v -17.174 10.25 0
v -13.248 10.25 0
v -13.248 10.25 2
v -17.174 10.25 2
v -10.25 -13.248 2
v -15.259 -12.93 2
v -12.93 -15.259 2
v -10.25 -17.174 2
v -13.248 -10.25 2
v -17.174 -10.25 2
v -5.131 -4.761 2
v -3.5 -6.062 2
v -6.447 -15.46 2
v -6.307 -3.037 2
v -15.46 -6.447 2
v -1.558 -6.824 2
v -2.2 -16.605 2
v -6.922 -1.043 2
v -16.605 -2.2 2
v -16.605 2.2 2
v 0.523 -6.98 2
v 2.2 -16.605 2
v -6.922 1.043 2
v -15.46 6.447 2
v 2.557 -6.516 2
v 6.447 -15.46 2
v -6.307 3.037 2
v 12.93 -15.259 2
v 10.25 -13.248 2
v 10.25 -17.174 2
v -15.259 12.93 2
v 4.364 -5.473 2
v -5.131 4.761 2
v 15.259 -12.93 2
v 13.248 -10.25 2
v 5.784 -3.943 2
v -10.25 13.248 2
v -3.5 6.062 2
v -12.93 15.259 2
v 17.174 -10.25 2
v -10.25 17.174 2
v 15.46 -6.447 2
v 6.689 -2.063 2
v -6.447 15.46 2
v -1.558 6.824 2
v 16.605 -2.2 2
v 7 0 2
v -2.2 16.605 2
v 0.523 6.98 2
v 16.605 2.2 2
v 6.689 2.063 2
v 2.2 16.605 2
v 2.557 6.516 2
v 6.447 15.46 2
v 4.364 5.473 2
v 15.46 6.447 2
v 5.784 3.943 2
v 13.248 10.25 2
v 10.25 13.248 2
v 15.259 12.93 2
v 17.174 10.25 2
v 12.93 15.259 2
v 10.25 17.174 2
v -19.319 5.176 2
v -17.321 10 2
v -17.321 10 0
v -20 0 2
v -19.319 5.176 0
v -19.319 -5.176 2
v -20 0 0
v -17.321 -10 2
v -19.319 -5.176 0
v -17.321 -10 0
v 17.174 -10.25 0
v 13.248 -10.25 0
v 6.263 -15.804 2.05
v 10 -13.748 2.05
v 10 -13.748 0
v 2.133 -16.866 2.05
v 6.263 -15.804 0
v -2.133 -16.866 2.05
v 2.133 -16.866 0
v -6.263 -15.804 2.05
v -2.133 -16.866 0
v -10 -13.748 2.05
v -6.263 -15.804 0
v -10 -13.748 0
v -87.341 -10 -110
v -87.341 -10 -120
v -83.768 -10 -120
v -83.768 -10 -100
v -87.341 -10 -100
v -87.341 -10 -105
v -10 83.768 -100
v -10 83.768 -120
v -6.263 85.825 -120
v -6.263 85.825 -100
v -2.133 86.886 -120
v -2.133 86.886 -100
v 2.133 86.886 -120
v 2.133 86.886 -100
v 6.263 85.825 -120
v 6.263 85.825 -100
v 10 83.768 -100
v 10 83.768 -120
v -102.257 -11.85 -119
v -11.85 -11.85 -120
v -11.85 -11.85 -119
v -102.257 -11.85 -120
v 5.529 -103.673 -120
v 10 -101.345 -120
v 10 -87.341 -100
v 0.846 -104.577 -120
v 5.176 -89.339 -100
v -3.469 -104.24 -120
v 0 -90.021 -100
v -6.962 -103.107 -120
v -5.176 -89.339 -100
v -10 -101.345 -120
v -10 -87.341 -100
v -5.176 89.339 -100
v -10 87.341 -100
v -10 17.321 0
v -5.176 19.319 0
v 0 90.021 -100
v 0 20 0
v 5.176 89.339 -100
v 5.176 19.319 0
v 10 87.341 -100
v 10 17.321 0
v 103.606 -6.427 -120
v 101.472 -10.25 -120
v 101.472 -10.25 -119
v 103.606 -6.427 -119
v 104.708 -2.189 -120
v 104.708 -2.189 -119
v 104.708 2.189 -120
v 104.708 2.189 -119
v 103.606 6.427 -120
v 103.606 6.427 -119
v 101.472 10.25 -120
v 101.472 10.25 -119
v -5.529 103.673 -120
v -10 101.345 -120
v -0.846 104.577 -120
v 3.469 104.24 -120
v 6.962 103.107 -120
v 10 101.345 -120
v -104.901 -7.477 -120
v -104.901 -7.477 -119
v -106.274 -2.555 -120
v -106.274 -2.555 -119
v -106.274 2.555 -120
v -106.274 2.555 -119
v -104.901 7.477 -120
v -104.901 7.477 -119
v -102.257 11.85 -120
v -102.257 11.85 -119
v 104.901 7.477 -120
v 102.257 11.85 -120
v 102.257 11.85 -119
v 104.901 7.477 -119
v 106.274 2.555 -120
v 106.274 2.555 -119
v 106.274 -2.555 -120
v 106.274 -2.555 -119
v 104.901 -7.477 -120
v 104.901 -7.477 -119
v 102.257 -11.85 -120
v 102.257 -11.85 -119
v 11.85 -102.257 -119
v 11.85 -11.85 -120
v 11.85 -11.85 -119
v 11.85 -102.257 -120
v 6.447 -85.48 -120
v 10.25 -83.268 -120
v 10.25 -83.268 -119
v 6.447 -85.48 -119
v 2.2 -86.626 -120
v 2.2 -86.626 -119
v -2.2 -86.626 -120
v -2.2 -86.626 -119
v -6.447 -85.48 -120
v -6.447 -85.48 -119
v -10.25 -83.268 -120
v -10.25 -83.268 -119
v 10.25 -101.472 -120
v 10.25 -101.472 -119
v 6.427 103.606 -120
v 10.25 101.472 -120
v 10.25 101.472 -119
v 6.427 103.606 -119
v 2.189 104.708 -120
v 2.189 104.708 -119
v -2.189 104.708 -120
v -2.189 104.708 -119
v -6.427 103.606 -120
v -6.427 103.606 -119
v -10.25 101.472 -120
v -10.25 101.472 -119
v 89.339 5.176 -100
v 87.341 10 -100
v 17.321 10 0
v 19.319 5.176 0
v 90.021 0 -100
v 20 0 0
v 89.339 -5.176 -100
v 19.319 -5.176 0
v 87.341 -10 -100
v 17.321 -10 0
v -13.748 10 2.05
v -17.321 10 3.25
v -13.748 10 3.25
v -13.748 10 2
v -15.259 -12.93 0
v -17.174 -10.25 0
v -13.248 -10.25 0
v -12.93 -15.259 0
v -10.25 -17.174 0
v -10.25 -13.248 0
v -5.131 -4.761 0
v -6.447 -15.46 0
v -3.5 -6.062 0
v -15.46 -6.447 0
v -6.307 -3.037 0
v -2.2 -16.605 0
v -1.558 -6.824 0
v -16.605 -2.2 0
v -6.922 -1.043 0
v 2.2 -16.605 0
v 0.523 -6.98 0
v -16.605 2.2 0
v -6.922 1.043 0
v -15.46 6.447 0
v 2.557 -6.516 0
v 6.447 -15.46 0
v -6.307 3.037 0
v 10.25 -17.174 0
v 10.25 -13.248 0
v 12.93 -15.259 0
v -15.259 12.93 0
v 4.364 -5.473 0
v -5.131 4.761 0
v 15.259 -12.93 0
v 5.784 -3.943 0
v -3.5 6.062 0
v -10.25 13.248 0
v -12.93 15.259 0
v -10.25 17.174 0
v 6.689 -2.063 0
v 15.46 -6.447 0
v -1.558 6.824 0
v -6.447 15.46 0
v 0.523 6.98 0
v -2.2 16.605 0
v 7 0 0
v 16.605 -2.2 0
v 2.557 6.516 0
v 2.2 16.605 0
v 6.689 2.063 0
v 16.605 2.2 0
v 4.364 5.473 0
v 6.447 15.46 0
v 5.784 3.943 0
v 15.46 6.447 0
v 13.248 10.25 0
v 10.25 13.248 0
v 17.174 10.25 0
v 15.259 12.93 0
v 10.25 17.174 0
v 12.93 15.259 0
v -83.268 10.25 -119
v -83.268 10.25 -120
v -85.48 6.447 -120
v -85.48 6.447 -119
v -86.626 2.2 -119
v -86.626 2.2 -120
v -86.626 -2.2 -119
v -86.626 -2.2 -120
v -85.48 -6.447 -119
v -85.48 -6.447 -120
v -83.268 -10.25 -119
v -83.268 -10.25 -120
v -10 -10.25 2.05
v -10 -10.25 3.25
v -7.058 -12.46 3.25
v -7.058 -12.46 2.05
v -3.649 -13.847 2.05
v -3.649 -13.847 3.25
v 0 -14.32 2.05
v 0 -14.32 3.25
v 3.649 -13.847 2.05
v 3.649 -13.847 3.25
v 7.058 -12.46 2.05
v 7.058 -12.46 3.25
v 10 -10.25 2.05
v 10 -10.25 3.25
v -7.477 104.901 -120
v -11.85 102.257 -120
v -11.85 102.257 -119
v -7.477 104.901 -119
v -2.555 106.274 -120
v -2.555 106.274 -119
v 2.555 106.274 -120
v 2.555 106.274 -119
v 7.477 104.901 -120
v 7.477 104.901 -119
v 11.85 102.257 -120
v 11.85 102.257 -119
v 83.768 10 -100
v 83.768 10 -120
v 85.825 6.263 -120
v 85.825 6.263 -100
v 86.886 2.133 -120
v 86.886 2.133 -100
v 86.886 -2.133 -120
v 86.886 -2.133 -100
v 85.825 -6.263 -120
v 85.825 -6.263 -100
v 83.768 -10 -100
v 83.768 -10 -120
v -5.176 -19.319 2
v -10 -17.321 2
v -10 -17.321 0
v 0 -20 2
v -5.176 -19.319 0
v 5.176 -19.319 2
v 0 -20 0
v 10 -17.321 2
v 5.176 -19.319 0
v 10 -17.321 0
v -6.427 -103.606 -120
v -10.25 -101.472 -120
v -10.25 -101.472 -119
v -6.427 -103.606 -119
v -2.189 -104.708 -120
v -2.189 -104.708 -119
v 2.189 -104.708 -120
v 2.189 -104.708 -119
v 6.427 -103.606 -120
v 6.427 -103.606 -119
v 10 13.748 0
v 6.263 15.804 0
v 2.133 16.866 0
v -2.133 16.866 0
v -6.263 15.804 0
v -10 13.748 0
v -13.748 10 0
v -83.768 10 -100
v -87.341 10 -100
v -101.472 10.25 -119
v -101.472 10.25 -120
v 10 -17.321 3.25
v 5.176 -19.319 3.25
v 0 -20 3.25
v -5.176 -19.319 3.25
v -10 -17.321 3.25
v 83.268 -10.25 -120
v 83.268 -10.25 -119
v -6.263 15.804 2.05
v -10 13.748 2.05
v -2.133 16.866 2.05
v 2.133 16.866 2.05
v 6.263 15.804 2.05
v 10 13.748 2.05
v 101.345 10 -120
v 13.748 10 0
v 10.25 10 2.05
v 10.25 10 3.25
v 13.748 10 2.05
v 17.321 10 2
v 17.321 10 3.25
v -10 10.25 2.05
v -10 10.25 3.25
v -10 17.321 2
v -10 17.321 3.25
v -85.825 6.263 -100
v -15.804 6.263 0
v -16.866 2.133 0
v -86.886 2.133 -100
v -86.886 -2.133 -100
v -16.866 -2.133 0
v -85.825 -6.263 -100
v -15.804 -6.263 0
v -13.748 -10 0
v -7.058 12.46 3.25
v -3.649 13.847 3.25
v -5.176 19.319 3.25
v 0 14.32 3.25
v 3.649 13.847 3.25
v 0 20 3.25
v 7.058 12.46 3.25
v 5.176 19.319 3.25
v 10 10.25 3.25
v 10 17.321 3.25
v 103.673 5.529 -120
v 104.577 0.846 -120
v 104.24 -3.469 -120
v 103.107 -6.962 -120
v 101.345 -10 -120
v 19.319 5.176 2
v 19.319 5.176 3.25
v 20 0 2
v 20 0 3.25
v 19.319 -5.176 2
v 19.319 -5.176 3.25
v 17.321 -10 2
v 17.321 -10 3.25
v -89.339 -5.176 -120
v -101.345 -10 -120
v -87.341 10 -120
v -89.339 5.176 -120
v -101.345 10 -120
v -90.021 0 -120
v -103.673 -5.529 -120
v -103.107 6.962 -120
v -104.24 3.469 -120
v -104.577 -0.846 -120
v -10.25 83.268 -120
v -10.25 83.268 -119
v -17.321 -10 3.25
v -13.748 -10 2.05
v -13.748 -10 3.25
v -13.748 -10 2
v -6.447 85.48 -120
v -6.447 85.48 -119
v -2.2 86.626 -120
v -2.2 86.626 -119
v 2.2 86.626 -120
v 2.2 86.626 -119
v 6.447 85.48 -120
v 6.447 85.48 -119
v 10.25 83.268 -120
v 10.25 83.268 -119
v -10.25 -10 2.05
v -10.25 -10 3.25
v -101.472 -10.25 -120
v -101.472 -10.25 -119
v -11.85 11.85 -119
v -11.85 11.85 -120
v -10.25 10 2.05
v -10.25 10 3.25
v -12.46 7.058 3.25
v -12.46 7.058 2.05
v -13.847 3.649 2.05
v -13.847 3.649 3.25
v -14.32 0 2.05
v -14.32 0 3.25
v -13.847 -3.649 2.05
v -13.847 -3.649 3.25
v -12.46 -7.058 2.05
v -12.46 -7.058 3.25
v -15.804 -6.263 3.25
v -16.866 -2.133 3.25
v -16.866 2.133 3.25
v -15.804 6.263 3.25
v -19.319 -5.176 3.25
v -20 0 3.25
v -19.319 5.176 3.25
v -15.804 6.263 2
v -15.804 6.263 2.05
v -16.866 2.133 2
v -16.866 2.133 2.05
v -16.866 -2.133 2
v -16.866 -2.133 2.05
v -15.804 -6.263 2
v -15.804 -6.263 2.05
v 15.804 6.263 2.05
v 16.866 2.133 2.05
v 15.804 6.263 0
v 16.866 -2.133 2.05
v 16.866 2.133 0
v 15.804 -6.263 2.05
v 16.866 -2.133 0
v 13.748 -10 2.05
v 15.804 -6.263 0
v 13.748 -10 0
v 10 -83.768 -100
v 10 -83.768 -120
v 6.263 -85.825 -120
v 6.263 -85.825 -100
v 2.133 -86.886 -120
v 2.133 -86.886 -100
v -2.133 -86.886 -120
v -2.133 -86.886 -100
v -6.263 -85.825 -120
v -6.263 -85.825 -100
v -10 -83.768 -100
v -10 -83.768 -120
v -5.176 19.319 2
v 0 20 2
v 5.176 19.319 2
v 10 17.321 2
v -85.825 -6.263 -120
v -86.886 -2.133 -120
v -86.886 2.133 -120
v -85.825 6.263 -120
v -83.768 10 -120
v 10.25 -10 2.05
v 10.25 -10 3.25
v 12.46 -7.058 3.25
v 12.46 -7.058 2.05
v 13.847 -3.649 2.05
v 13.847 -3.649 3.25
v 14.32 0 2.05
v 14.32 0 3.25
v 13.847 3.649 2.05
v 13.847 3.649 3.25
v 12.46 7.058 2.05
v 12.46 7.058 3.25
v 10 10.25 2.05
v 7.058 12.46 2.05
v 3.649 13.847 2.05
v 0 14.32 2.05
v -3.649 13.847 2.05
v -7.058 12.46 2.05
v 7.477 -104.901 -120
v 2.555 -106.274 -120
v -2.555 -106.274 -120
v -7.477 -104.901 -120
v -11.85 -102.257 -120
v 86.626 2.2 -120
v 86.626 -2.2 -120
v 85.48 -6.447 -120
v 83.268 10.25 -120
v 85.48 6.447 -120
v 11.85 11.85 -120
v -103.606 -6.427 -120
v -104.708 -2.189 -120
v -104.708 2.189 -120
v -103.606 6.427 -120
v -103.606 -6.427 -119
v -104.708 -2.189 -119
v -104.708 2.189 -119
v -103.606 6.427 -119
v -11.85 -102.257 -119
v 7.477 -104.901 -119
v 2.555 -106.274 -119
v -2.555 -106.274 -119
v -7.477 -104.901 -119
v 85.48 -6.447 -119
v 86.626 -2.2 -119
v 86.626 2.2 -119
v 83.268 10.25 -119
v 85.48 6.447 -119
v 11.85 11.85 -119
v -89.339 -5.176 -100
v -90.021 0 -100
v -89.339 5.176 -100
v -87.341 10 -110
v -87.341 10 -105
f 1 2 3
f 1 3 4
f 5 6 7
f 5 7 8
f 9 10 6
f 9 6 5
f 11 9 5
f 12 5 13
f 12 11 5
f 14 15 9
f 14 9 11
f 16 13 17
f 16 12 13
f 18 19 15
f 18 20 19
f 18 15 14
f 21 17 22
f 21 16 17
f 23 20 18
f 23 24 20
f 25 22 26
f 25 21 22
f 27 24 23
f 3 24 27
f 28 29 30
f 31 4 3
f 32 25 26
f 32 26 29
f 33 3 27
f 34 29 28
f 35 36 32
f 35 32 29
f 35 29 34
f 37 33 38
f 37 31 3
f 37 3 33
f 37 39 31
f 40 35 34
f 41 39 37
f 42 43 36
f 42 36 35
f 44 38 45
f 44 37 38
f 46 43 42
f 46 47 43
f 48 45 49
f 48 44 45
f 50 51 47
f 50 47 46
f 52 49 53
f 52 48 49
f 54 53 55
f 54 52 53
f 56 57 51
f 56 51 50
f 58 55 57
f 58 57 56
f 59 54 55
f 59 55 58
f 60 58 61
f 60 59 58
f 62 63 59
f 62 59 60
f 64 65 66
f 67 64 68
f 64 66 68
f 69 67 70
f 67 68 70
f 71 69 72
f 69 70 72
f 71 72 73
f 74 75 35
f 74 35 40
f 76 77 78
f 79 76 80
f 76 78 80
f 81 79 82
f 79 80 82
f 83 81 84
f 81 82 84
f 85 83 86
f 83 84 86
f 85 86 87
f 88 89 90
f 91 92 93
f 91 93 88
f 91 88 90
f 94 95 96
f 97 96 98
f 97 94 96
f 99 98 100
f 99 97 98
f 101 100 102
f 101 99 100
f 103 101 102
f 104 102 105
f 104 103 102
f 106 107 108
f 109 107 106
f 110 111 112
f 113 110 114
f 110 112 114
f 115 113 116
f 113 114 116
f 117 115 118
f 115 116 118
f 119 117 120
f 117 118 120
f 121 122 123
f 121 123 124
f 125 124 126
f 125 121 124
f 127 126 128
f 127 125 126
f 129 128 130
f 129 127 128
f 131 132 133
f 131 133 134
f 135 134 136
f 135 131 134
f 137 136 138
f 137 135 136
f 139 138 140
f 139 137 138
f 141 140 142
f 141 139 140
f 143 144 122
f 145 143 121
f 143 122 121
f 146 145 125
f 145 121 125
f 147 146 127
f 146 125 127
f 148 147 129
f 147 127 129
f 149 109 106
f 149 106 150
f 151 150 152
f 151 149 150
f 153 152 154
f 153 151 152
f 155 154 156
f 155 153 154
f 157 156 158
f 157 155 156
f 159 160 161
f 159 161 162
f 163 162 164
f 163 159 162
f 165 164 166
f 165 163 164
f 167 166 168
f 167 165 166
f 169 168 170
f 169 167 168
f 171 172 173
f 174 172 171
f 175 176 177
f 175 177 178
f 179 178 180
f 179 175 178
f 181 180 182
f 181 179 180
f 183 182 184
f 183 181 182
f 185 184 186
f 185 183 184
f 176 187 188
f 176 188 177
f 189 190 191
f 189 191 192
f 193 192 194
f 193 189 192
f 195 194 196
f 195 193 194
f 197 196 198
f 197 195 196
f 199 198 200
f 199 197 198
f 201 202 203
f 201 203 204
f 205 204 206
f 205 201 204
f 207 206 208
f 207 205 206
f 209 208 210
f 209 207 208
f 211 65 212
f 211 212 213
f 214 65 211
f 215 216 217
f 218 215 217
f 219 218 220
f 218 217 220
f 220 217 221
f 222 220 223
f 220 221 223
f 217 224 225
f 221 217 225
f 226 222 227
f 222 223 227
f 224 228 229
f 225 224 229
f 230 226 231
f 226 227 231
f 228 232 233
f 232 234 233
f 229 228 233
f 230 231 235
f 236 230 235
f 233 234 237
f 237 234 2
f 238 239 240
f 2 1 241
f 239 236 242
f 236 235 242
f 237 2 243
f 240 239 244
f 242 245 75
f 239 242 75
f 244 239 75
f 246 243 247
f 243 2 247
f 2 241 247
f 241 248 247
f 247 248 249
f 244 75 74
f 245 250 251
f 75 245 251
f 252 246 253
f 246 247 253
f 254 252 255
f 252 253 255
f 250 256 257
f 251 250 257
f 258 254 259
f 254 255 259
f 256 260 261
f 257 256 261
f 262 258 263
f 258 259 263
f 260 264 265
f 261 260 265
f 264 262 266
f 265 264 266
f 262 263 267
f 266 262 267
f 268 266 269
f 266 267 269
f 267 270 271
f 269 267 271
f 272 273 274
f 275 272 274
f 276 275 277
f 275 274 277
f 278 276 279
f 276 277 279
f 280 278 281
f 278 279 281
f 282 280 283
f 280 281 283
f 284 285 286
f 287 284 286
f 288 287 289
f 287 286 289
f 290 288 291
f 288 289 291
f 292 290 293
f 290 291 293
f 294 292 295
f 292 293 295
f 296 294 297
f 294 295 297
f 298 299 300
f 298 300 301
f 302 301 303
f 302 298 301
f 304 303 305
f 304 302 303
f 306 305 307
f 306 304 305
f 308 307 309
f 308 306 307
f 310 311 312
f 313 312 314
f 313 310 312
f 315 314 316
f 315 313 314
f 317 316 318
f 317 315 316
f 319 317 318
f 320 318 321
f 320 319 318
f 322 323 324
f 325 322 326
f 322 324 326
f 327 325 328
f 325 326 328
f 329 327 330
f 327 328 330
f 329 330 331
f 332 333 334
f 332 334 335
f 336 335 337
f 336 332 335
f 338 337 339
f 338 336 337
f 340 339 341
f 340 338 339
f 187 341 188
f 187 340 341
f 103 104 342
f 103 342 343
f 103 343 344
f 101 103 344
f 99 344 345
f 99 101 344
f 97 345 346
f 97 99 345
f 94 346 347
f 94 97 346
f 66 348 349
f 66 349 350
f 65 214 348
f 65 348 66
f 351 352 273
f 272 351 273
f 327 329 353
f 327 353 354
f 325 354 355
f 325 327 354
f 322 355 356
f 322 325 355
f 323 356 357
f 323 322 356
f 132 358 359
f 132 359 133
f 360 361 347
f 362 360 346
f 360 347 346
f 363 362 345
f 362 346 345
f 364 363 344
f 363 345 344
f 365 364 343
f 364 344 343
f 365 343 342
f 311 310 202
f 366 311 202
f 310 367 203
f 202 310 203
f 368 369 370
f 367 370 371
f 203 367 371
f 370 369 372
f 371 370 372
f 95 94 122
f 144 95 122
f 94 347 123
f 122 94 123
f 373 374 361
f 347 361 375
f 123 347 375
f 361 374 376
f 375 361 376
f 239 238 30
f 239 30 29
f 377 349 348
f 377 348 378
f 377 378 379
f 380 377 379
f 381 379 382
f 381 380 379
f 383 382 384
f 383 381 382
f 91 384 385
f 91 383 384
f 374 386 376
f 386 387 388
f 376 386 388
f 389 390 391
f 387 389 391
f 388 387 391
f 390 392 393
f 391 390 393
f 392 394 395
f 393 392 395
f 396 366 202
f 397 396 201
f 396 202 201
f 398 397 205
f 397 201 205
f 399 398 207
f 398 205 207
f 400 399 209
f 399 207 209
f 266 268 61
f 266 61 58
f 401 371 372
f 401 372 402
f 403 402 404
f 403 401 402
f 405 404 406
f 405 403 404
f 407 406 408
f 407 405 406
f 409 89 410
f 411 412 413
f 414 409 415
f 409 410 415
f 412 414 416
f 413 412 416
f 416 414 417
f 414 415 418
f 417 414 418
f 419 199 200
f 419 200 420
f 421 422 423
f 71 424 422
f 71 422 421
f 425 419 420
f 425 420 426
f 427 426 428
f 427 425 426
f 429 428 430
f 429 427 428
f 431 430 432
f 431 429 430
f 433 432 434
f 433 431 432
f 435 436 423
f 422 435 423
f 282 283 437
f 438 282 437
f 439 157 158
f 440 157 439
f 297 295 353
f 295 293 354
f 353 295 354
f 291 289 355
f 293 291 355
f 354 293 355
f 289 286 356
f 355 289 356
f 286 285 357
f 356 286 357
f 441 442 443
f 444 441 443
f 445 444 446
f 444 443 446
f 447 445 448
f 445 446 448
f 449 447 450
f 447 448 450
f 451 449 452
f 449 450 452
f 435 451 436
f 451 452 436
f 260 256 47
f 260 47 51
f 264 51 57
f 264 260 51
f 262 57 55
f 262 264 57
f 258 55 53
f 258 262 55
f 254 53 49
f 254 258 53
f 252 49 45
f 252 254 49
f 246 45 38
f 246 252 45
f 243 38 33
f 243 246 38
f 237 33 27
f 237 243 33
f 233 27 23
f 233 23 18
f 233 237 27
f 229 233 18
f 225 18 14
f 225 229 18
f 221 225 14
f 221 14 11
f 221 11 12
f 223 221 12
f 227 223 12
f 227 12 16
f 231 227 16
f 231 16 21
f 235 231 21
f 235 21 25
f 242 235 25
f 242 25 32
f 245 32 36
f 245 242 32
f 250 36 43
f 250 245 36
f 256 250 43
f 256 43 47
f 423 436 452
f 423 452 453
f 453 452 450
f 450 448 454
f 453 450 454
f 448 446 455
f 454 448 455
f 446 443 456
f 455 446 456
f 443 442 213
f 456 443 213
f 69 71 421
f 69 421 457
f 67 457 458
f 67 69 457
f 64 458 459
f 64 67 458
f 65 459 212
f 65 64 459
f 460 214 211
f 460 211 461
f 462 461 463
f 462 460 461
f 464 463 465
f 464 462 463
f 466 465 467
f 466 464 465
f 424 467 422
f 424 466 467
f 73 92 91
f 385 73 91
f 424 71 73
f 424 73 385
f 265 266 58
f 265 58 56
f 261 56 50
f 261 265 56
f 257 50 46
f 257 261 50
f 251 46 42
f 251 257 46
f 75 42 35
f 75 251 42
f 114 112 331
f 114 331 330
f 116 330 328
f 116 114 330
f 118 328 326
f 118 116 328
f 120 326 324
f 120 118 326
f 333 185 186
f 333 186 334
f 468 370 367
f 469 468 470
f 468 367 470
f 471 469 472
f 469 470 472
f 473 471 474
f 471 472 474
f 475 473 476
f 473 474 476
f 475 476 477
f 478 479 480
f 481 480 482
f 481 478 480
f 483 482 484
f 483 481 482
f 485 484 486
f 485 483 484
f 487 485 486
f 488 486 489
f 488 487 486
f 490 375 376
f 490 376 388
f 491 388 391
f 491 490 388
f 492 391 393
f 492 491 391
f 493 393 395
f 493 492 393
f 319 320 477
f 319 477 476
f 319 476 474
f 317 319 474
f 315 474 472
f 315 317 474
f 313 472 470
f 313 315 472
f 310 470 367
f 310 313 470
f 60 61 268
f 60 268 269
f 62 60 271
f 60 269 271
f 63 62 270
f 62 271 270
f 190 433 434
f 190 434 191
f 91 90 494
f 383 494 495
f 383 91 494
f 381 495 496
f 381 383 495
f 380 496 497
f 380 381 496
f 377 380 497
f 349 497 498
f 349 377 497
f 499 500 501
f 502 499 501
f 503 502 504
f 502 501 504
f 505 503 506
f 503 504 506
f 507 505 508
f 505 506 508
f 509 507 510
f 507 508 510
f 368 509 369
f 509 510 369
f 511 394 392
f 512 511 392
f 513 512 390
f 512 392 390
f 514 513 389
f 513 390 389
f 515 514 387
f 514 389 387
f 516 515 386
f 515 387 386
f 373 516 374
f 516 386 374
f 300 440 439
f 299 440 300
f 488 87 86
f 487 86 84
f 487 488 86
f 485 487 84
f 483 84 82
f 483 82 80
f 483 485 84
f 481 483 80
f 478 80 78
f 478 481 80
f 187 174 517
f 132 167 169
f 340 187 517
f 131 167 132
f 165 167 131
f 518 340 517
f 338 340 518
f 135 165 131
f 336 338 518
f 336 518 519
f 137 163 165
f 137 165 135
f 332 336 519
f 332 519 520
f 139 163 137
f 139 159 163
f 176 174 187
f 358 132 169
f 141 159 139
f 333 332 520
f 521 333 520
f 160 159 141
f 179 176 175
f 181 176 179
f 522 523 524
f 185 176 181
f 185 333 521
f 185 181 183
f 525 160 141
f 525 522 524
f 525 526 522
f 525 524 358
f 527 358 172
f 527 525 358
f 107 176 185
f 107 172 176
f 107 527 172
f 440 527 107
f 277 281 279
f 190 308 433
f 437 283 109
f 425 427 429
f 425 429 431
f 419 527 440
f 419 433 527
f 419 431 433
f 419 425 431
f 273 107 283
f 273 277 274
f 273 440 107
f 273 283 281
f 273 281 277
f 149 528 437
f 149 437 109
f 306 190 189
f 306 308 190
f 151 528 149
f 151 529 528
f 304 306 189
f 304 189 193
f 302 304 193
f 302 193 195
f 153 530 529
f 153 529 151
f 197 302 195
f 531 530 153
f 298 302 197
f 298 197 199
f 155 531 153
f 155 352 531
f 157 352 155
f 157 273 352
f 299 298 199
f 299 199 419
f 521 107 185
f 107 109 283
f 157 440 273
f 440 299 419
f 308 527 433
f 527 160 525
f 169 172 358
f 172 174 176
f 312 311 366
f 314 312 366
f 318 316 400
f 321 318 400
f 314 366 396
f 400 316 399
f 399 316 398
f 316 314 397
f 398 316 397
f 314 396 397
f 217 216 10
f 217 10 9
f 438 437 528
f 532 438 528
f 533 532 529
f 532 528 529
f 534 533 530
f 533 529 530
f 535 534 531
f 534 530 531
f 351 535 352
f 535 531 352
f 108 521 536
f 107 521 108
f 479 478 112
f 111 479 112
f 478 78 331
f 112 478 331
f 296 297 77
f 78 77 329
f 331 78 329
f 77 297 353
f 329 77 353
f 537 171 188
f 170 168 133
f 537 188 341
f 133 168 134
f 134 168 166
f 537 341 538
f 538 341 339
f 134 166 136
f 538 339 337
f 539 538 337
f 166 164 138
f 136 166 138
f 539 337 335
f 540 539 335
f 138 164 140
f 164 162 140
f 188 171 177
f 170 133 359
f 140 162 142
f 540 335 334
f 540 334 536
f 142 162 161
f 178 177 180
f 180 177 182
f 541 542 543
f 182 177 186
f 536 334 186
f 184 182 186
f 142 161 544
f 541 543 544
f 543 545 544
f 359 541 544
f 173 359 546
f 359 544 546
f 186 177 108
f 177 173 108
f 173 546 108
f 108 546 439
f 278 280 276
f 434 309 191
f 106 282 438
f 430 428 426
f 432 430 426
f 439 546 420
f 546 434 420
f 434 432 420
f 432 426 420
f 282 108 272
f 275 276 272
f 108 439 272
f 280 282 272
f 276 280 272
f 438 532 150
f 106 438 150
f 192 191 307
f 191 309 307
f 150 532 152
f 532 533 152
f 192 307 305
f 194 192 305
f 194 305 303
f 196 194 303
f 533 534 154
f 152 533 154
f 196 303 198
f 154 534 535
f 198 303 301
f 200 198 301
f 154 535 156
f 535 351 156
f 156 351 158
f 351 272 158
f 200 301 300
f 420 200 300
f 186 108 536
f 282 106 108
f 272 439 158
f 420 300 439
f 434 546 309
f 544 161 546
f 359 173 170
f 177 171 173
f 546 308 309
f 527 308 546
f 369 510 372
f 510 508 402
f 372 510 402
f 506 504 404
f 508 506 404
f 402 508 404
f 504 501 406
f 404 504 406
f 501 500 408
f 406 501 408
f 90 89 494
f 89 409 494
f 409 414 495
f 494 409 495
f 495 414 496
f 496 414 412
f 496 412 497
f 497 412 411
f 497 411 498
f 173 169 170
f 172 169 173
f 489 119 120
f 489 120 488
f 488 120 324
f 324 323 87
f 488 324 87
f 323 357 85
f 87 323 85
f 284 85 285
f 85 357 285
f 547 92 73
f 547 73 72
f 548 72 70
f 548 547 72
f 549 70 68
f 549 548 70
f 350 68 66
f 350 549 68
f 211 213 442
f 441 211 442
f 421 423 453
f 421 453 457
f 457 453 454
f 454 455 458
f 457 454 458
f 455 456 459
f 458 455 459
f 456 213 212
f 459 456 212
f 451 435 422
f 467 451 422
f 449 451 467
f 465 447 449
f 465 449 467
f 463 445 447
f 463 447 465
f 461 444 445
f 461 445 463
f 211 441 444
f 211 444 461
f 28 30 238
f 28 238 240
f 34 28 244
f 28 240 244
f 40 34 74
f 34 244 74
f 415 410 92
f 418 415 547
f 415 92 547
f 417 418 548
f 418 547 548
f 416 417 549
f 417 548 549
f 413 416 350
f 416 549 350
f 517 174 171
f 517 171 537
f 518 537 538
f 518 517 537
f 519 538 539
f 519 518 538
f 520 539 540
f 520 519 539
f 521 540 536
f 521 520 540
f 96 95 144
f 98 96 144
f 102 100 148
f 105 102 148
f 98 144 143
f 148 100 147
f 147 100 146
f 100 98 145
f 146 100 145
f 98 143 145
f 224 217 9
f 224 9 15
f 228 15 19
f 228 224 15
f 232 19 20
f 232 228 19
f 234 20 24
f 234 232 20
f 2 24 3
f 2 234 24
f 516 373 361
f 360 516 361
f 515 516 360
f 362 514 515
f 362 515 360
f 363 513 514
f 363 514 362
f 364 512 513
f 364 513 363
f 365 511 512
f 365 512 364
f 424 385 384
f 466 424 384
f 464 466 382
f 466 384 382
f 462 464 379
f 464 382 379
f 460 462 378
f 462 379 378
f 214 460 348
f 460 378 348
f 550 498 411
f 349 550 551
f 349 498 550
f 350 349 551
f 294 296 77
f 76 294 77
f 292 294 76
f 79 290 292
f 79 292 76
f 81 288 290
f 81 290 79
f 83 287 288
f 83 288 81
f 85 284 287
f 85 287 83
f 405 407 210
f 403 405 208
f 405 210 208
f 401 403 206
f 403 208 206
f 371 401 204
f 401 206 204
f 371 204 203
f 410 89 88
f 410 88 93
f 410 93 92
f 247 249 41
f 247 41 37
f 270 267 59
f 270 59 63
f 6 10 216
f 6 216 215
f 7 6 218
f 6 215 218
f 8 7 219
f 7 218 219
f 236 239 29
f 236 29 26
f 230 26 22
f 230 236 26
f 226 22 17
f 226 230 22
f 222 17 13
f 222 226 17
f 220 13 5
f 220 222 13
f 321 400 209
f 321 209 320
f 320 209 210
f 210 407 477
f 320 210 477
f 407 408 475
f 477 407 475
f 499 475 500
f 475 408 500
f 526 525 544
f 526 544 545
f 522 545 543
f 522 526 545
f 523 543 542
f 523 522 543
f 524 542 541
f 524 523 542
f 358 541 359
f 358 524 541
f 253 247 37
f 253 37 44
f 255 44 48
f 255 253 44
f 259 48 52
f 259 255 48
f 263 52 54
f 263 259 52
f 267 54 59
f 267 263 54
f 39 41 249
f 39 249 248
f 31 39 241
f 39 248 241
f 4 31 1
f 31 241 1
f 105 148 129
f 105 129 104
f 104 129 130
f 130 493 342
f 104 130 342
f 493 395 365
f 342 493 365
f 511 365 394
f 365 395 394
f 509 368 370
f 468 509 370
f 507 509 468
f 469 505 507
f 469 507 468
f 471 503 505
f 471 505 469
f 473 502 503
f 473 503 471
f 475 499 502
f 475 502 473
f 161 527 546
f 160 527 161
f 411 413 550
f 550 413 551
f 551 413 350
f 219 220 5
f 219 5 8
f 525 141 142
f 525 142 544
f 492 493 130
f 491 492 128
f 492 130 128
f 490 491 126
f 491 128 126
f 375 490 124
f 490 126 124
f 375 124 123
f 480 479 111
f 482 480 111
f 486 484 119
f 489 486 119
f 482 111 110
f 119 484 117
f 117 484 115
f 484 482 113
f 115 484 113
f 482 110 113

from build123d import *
from build123d.topology import SkipClean

# Parameters (mm, degrees)
SKETCH1_R           = 20
SKETCH1_R_2         = 7
BOSS_EXTRUDE1_DEPTH = 2
BOSS_EXTRUDE3_DEPTH = 20
CUT_EXTRUDE1_DEPTH  = 152.339803484
BOSS_EXTRUDE4_DEPTH = 1.25
BOSS_EXTRUDE5_DEPTH = 1.2
CIRPATTERN3_COUNT   = 4
BOSS_EXTRUDE6_DEPTH = 1


with BuildPart() as part:
    # Sketch1 → Boss-Extrude1 (new body)
    with BuildSketch(Plane.XY):
        Circle(SKETCH1_R)
        Circle(SKETCH1_R_2, mode=Mode.SUBTRACT)
    extrude(amount=BOSS_EXTRUDE1_DEPTH)

    # Sweep1: sweep along a path in Sketch2
    with BuildLine(Plane(origin=(0, 0, 0), x_dir=(1, 0, 0), z_dir=(0, 1, 0))) as sweep1_path:
        Line((-20, 0), (-90.020753821, 100))
    # Sketch3 → Sweep1 (sweep)
    with BuildSketch(Plane(origin=(0, 0, 0), x_dir=(-1, 0, 0), z_dir=(0, 0, -1))):
        with BuildLine():
            Line((13.747727085, -10), (17.320508076, -10))
            ThreePointArc((17.320508076, -10), (20, 0), (17.320508076, 10))
            Line((17.320508076, 10), (13.747727085, 10))
            ThreePointArc((13.747727085, 10), (17, 0), (13.747727085, -10))
        make_face()
    sweep(path=sweep1_path.line)

    # Sketch4 → Boss-Extrude3 (add)
    with BuildSketch(Plane(origin=(0, 0, -100), x_dir=(-1, 0, 0), z_dir=(0, 0, -1))):
        with BuildLine():
            Line((87.341261897, -10), (83.768480906, -10))
            ThreePointArc((83.768480906, -10), (87.020753821, 0), (83.768480906, 10))
            Line((83.768480906, 10), (87.341261897, 10))
            ThreePointArc((87.341261897, 10), (90.020753821, 0), (87.341261897, -10))
        make_face()
    extrude(amount=BOSS_EXTRUDE3_DEPTH)

    # Sketch5 → Cut-Extrude1 (cut, through all)
    # profile 1 of 4: a face of its own
    with BuildSketch(Plane(origin=(0, 0, 0), x_dir=(-1, 0, 0), z_dir=(0, 0, -1))):
        with BuildLine():
            Line((17.464249197, -10.25), (13.247641299, -10.25))
            ThreePointArc((13.247641299, -10.25), (16.75, 0), (13.247641299, 10.25))
            Line((13.247641299, 10.25), (17.464249197, 10.25))
            ThreePointArc((17.464249197, 10.25), (20.25, 0), (17.464249197, -10.25))
        make_face()
        with BuildLine():
            Line((17.320508076, -10), (13.747727085, -10))
            ThreePointArc((13.747727085, -10), (17, 0), (13.747727085, 10))
            Line((13.747727085, 10), (17.320508076, 10))
            ThreePointArc((17.320508076, 10), (20, 0), (17.320508076, -10))
        make_face(mode=Mode.SUBTRACT)
    # profile 2 of 4: a face of its own
    with BuildSketch(Plane(origin=(0, 0, 0), x_dir=(-1, 0, 0), z_dir=(0, 0, -1))):
        with BuildLine():
            Line((-10.25, -17.464249197), (-10.25, -13.247641299))
            ThreePointArc((-10.25, -13.247641299), (0, -16.75), (10.25, -13.247641299))
            Line((10.25, -13.247641299), (10.25, -17.464249197))
            ThreePointArc((10.25, -17.464249197), (0, -20.25), (-10.25, -17.464249197))
        make_face()
        with BuildLine():
            Line((-10, -17.320508076), (-10, -13.747727085))
            ThreePointArc((-10, -13.747727085), (0, -17), (10, -13.747727085))
            Line((10, -13.747727085), (10, -17.320508076))
            ThreePointArc((10, -17.320508076), (0, -20), (-10, -17.320508076))
        make_face(mode=Mode.SUBTRACT)
    # profile 3 of 4: a face of its own
    with BuildSketch(Plane(origin=(0, 0, 0), x_dir=(-1, 0, 0), z_dir=(0, 0, -1))):
        with BuildLine():
            Line((-17.464249197, 10.25), (-13.247641299, 10.25))
            ThreePointArc((-13.247641299, 10.25), (-16.75, 0), (-13.247641299, -10.25))
            Line((-13.247641299, -10.25), (-17.464249197, -10.25))
            ThreePointArc((-17.464249197, -10.25), (-20.25, 0), (-17.464249197, 10.25))
        make_face()
        with BuildLine():
            Line((-17.320508076, 10), (-13.747727085, 10))
            ThreePointArc((-13.747727085, 10), (-17, 0), (-13.747727085, -10))
            Line((-13.747727085, -10), (-17.320508076, -10))
            ThreePointArc((-17.320508076, -10), (-20, 0), (-17.320508076, 10))
        make_face(mode=Mode.SUBTRACT)
    # profile 4 of 4: a face of its own
    with BuildSketch(Plane(origin=(0, 0, 0), x_dir=(-1, 0, 0), z_dir=(0, 0, -1))):
        with BuildLine():
            Line((10.25, 17.464249197), (10.25, 13.247641299))
            ThreePointArc((10.25, 13.247641299), (0, 16.75), (-10.25, 13.247641299))
            Line((-10.25, 13.247641299), (-10.25, 17.464249197))
            ThreePointArc((-10.25, 17.464249197), (0, 20.25), (10.25, 17.464249197))
        make_face()
        with BuildLine():
            Line((10, 17.320508076), (10, 13.747727085))
            ThreePointArc((10, 13.747727085), (0, 17), (-10, 13.747727085))
            Line((-10, 13.747727085), (-10, 17.320508076))
            ThreePointArc((-10, 17.320508076), (0, 20), (10, 17.320508076))
        make_face(mode=Mode.SUBTRACT)
    extrude(amount=-CUT_EXTRUDE1_DEPTH, mode=Mode.SUBTRACT)


with BuildPart() as cut_extrude1_piece_1:
    # of the separate pieces the step leaves, piece 1, a body of its own (cut_extrude1_pieces_kept)
    add(part.part.solids().sort_by_distance((-17.320508076, 10, 2))[0])

    # Sketch6 → Boss-Extrude4 (add)
    with SkipClean():  # the faces are left unmerged after this step: merging them gives an invalid solid
        with BuildSketch(Plane.XY.offset(2)):
            with BuildLine():
                Line((-17.320508076, 10), (-13.747727085, 10))
                ThreePointArc((-13.747727085, 10), (-17, 0), (-13.747727085, -10))
                Line((-13.747727085, -10), (-17.320508076, -10))
                ThreePointArc((-17.320508076, -10), (-20, 0), (-17.320508076, 10))
            make_face()
        extrude(amount=BOSS_EXTRUDE4_DEPTH)

    # Sketch7 → Boss-Extrude5 (add)
    with SkipClean():  # the faces are left unmerged after this step: merging them gives an invalid solid
        with BuildSketch(Plane.XY.offset(3.25)):
            with BuildLine():
                Line((-13.747727085, 10), (-10.25, 10))
                ThreePointArc((-10.25, 10), (-14.320003492, 0), (-10.25, -10))
                Line((-10.25, -10), (-13.747727085, -10))
                ThreePointArc((-13.747727085, -10), (-17, 0), (-13.747727085, 10))
            make_face()
        extrude(amount=-BOSS_EXTRUDE5_DEPTH)

    # Sketch9 for Loft1 → Loft1 section 0
    with SkipClean():  # the faces are left unmerged after this step: merging them gives an invalid solid
        with BuildSketch(Plane(origin=(0, 0, -120), x_dir=(-1, 0, 0), z_dir=(0, 0, -1))):
            with BuildLine():
                Line((83.768480906, -10), (101.345412661, -10))
                # circular arc as an exact rational Bezier (weights 1, cos(half-angle), 1)
                Bezier((101.345412661, -10), (108.619342335, 0), (101.345412661, 10), weights=[1, 0.808689829, 1])
                Line((101.345412661, 10), (83.768480906, 10))
                Bezier((83.768480906, 10), (91.04241058, 0), (83.768480906, -10), weights=[1, 0.808689829, 1])
            make_face()
        # Sketch4<2> for Loft1 → Loft1 section 1
        with BuildSketch(Plane(origin=(0, 0, -100), x_dir=(-1, 0, 0), z_dir=(0, 0, -1))):
            with BuildLine():
                Line((87.341261897, -10), (83.768480906, -10))
                Bezier((83.768480906, -10), (91.04241058, 0), (83.768480906, 10), weights=[1, 0.808689829, 1])
                Line((83.768480906, 10), (87.341261897, 10))
                Bezier((87.341261897, 10), (93.114764589, 0), (87.341261897, -10), weights=[1, 0.866025404, 1])
            make_face()
        loft()


with BuildPart() as cut_extrude1_piece_2:
    # of the separate pieces the step leaves, piece 2, a body of its own (cut_extrude1_pieces_kept)
    add(part.part.solids().sort_by_distance((17.173744496, -10.25, 2))[0])


with BuildPart() as cirpattern3_1:
    # CirPattern3: pattern copy
    add(cut_extrude1_piece_1.part.rotate(Axis((0, 0, 0), (0, 0, -1)), 1 * 360 / CIRPATTERN3_COUNT))


with BuildPart() as cirpattern3_2:
    # CirPattern3: pattern copy
    add(cut_extrude1_piece_1.part.rotate(Axis((0, 0, 0), (0, 0, -1)), 2 * 360 / CIRPATTERN3_COUNT))


with BuildPart() as cirpattern3_3:
    # CirPattern3: pattern copy
    add(cut_extrude1_piece_1.part.rotate(Axis((0, 0, 0), (0, 0, -1)), 3 * 360 / CIRPATTERN3_COUNT))


with BuildPart() as body_6:
    # Sketch10 → Boss-Extrude6 (new body)
    with BuildSketch(Plane(origin=(0, 0, -120), x_dir=(-1, 0, 0), z_dir=(0, 0, -1))):
        with BuildLine():
            Line((11.85, -102.257153506), (11.85, -11.85))
            Line((11.85, -11.85), (102.257153506, -11.85))
            ThreePointArc((102.257153506, -11.85), (106.447685576, 0), (102.257153506, 11.85))
            Line((102.257153506, 11.85), (11.85, 11.85))
            Line((11.85, 11.85), (11.85, 102.257153506))
            ThreePointArc((11.85, 102.257153506), (0, 106.447685576), (-11.85, 102.257153506))
            Line((-11.85, 102.257153506), (-11.85, 11.85))
            Line((-11.85, 11.85), (-102.257153506, 11.85))
            ThreePointArc((-102.257153506, 11.85), (-106.447685576, 0), (-102.257153506, -11.85))
            Line((-102.257153506, -11.85), (-11.85, -11.85))
            Line((-11.85, -11.85), (-11.85, -102.257153506))
            ThreePointArc((-11.85, -102.257153506), (0, -106.447685576), (11.85, -102.257153506))
        make_face()
        with BuildLine():
            Line((101.472122501, 10.25), (83.26839512, 10.25))
            ThreePointArc((83.26839512, 10.25), (86.770753821, 0), (83.26839512, -10.25))
            Line((83.26839512, -10.25), (101.472122501, -10.25))
            ThreePointArc((101.472122501, -10.25), (104.847685576, 0), (101.472122501, 10.25))
        make_face(mode=Mode.SUBTRACT)
        with BuildLine():
            Line((-10.25, -101.472122501), (-10.25, -83.26839512))
            ThreePointArc((-10.25, -83.26839512), (0, -86.770753821), (10.25, -83.26839512))
            Line((10.25, -83.26839512), (10.25, -101.472122501))
            ThreePointArc((10.25, -101.472122501), (0, -104.847685576), (-10.25, -101.472122501))
        make_face(mode=Mode.SUBTRACT)
        with BuildLine():
            Line((-101.472122501, 10.25), (-83.26839512, 10.25))
            ThreePointArc((-83.26839512, 10.25), (-86.770753821, 0), (-83.26839512, -10.25))
            Line((-83.26839512, -10.25), (-101.472122501, -10.25))
            ThreePointArc((-101.472122501, -10.25), (-104.847685576, 0), (-101.472122501, 10.25))
        make_face(mode=Mode.SUBTRACT)
        with BuildLine():
            Line((10.25, 101.472122501), (10.25, 83.26839512))
            ThreePointArc((10.25, 83.26839512), (0, 86.770753821), (-10.25, 83.26839512))
            Line((-10.25, 83.26839512), (-10.25, 101.472122501))
            ThreePointArc((-10.25, 101.472122501), (0, 104.847685576), (10.25, 101.472122501))
        make_face(mode=Mode.SUBTRACT)
    extrude(amount=-BOSS_EXTRUDE6_DEPTH)


solid = Compound([cut_extrude1_piece_1.part, cut_extrude1_piece_2.part, cirpattern3_1.part, cirpattern3_2.part, cirpattern3_3.part, body_6.part])
